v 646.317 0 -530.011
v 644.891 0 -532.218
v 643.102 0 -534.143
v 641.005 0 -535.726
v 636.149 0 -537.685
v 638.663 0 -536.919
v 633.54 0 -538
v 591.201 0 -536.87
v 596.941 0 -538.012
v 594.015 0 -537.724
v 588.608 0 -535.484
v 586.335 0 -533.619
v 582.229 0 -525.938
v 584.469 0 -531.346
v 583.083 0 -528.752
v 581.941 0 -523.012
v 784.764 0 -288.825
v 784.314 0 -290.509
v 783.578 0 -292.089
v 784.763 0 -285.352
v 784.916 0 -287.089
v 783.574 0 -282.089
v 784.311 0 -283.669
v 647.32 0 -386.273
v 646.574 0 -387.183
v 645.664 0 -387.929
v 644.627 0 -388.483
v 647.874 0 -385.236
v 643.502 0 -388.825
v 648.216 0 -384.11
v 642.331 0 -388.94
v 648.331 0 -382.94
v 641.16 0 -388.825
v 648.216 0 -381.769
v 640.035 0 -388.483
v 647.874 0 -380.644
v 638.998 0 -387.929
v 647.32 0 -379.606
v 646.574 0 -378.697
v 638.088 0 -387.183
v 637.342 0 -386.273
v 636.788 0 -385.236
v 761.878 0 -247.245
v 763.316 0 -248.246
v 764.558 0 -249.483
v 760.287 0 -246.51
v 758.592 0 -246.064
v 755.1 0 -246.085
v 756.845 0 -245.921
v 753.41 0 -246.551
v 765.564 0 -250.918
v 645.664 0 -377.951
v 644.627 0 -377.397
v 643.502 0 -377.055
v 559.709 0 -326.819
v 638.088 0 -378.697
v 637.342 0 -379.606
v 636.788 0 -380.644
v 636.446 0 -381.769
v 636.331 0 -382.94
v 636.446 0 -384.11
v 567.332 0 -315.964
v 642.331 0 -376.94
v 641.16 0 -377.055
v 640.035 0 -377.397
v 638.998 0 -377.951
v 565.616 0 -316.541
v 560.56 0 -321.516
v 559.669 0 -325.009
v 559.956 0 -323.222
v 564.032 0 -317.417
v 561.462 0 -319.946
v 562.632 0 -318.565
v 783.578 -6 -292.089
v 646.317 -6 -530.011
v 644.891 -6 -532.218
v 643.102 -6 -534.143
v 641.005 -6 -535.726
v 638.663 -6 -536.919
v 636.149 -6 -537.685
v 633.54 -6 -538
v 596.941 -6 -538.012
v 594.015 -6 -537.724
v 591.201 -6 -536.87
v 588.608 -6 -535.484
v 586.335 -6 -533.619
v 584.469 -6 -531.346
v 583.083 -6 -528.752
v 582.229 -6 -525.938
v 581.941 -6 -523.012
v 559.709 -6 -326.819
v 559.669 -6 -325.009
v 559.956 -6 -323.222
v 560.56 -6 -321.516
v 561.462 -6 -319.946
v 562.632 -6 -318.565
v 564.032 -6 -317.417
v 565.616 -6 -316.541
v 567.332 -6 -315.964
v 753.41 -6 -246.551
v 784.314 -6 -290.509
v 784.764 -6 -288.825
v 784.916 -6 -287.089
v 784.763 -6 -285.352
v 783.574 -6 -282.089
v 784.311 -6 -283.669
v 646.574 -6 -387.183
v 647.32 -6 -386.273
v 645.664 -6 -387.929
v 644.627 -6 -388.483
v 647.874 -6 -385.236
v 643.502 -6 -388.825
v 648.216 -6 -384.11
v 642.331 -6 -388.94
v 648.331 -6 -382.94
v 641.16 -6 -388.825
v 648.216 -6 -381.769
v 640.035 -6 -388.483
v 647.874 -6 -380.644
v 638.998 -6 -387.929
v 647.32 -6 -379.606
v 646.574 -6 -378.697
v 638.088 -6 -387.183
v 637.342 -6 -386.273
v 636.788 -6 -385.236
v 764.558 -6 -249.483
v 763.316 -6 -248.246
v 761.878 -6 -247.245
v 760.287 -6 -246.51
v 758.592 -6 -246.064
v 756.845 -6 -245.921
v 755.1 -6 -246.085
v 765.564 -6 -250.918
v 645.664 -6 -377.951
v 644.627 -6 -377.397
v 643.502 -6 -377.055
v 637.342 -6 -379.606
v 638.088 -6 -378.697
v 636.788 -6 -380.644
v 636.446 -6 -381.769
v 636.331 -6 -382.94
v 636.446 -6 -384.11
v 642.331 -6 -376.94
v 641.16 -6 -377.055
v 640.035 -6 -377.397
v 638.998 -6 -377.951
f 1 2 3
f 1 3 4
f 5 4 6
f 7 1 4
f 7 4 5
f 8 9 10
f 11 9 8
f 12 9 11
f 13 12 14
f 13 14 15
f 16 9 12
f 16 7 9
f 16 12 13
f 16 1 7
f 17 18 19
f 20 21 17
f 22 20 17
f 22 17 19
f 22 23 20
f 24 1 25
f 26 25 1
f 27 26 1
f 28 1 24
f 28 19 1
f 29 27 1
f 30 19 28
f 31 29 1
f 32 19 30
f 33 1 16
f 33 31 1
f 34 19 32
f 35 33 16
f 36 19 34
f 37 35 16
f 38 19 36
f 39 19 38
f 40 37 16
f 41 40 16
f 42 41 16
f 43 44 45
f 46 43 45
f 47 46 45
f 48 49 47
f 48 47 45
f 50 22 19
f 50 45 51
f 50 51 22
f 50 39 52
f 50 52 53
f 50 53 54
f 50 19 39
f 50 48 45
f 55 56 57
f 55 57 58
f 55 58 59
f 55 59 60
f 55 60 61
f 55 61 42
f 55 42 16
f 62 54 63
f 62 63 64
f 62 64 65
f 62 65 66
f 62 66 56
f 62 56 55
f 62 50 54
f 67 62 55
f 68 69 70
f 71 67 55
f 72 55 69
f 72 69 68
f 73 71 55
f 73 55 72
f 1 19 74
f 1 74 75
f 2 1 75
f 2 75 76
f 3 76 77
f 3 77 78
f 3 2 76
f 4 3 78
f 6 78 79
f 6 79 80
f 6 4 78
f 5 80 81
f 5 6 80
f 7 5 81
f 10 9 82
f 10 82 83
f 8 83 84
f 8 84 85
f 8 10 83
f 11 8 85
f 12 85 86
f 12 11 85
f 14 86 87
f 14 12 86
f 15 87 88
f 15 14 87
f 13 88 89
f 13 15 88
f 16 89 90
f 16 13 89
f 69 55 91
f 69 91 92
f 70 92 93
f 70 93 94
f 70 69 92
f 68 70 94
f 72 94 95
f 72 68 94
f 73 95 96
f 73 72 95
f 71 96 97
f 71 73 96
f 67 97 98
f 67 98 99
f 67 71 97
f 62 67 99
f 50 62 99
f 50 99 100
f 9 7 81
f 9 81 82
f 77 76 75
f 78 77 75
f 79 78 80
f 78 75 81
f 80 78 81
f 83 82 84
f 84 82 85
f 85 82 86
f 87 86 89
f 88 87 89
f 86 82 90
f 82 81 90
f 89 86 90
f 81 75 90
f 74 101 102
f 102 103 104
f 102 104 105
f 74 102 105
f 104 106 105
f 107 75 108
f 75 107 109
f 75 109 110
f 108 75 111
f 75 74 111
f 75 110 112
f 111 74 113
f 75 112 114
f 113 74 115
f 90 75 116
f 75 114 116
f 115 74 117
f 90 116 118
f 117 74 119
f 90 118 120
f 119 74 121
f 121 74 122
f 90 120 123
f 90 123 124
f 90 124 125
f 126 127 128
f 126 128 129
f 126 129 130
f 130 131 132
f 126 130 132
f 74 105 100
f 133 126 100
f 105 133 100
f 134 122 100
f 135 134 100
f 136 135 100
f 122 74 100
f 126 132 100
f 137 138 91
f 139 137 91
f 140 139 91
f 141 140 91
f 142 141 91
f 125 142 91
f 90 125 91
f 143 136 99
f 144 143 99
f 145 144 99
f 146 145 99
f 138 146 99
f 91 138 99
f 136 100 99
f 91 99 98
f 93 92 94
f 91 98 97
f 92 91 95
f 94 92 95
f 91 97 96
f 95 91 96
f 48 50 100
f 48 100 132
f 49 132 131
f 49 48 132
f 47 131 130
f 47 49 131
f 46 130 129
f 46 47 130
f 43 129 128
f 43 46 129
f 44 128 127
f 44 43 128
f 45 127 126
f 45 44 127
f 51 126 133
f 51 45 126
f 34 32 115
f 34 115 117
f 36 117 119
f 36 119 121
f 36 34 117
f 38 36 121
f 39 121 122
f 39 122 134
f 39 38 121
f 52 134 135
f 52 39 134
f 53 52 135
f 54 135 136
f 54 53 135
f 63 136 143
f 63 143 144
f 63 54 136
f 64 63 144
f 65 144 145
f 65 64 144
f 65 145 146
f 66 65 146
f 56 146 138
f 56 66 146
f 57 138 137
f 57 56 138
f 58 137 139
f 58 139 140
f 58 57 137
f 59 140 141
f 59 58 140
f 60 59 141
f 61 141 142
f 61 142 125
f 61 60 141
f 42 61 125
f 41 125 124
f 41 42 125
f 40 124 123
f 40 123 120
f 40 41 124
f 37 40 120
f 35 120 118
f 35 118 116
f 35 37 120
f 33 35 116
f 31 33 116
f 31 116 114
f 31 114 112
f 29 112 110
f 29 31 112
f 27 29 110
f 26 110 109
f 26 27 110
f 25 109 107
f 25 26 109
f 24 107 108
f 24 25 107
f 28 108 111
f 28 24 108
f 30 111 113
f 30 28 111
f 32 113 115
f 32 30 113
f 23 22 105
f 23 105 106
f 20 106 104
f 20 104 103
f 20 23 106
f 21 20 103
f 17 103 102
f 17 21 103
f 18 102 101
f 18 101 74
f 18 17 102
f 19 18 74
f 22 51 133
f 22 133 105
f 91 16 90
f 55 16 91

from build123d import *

# Parameters (mm, degrees)
SKETCH1_R           = 6
BOSS_EXTRUDE1_DEPTH = 6


with BuildPart() as part:
    # Sketch1 → Boss-Extrude1 (new body)
    with BuildSketch(Plane.XZ):
        with BuildLine():
            Line((633.54016476, -538), (596.941268489, -538.01196066))
            ThreePointArc((596.941268489, -538.01196066), (586.334666771, -533.618562378), (581.941268489, -523.01196066))
            Line((581.941268489, -523.01196066), (559.709119696, -326.819235636))
            ThreePointArc((559.709119696, -326.819235636), (561.462040963, -319.946040825), (567.332363616, -315.964476832))
            Line((567.332363616, -315.964476832), (753.41040417, -246.551436819))
            ThreePointArc((753.41040417, -246.551436819), (760.286617927, -246.509729538), (765.564086289, -250.917947183))
            Line((765.564086289, -250.917947183), (783.574274063, -282.088977586))
            ThreePointArc((783.574274063, -282.088977586), (784.915653972, -287.088539485), (783.577542101, -292.088977052))
            Line((783.577542101, -292.088977052), (646.316882655, -530.010943959))
            ThreePointArc((646.316882655, -530.010943959), (641.004531543, -535.726307145), (633.54016476, -538))
        make_face()
        with Locations((642.330973066, -382.939920306)):
            Circle(SKETCH1_R, mode=Mode.SUBTRACT)
    extrude(amount=BOSS_EXTRUDE1_DEPTH)


solid = part.part
